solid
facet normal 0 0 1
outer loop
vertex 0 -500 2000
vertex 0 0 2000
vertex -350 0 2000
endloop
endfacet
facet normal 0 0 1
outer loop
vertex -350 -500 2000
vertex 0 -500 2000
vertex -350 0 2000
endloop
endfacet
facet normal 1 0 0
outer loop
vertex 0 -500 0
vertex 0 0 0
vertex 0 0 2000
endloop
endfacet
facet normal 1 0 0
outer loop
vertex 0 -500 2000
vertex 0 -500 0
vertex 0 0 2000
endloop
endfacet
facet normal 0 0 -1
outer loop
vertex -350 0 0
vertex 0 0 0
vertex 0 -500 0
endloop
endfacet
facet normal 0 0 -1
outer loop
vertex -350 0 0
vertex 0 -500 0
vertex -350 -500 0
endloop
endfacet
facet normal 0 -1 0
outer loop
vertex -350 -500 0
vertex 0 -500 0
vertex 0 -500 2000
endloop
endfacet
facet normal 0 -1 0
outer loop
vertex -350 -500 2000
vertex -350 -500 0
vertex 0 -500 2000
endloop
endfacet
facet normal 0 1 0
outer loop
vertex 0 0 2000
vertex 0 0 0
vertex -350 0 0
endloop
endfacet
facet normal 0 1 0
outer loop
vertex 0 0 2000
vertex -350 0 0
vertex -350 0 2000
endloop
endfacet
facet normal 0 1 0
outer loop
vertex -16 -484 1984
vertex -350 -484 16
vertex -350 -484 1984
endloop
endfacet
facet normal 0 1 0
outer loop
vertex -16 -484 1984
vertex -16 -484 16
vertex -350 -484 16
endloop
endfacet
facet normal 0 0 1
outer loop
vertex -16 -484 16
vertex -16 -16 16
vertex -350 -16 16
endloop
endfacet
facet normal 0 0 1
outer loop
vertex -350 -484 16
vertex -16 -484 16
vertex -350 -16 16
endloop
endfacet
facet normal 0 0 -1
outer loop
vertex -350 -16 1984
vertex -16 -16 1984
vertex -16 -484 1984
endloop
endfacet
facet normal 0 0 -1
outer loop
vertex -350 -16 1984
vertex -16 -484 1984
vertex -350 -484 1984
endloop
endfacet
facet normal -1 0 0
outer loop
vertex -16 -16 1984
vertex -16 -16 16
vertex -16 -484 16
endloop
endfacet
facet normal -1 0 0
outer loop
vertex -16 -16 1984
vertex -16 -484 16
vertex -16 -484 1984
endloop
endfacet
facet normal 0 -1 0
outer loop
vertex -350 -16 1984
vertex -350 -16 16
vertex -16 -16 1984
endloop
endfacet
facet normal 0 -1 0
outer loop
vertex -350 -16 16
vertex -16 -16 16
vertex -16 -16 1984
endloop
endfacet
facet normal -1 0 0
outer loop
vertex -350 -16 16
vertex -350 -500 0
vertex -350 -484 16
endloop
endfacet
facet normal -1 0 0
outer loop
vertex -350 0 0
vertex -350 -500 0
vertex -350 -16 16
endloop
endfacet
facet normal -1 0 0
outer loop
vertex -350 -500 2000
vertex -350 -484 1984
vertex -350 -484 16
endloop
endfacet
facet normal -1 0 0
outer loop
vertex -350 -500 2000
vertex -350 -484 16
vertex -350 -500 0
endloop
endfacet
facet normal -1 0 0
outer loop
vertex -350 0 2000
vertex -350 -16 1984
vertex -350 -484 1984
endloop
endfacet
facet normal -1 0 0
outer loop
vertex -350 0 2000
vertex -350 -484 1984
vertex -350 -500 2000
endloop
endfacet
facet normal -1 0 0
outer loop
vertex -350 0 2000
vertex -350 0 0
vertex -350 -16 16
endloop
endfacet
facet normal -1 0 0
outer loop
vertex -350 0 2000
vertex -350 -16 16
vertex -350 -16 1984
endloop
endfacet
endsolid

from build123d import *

# Parameters (mm, degrees)
F0_W     = 45.8271801472
F0_H     = 53.0440360308
F1_DEPTH = 350
F2_DEPTH = 500
F3_DEPTH = 2000
F4_T     = -16


with BuildPart() as f1:
    # F0 (on Right) → F1 (new body)
    with BuildSketch(Plane.YZ):
        with Locations((-22.9135900736, 26.5220180154)):
            Rectangle(F0_W, F0_H)
    extrude(amount=-F1_DEPTH)

    # F2 (add): a face of the model
    f2_faces = [f1.faces().sort_by_distance(p)[0] for p in [
        (-175, 0, 26.5220180154),
    ]]
    extrude(f2_faces, amount=-F2_DEPTH)

    # F3 (add): a face of the model
    f3_faces = [f1.faces().sort_by_distance(p)[0] for p in [
        (-175, -250, 0),
    ]]
    extrude(f3_faces, amount=-F3_DEPTH)

    # F4
    f4_openings = [f1.faces().sort_by_distance(p)[0] for p in [
        (-350, -250, 1000),
    ]]
    offset(amount=F4_T, openings=f4_openings)


solid = f1.part
